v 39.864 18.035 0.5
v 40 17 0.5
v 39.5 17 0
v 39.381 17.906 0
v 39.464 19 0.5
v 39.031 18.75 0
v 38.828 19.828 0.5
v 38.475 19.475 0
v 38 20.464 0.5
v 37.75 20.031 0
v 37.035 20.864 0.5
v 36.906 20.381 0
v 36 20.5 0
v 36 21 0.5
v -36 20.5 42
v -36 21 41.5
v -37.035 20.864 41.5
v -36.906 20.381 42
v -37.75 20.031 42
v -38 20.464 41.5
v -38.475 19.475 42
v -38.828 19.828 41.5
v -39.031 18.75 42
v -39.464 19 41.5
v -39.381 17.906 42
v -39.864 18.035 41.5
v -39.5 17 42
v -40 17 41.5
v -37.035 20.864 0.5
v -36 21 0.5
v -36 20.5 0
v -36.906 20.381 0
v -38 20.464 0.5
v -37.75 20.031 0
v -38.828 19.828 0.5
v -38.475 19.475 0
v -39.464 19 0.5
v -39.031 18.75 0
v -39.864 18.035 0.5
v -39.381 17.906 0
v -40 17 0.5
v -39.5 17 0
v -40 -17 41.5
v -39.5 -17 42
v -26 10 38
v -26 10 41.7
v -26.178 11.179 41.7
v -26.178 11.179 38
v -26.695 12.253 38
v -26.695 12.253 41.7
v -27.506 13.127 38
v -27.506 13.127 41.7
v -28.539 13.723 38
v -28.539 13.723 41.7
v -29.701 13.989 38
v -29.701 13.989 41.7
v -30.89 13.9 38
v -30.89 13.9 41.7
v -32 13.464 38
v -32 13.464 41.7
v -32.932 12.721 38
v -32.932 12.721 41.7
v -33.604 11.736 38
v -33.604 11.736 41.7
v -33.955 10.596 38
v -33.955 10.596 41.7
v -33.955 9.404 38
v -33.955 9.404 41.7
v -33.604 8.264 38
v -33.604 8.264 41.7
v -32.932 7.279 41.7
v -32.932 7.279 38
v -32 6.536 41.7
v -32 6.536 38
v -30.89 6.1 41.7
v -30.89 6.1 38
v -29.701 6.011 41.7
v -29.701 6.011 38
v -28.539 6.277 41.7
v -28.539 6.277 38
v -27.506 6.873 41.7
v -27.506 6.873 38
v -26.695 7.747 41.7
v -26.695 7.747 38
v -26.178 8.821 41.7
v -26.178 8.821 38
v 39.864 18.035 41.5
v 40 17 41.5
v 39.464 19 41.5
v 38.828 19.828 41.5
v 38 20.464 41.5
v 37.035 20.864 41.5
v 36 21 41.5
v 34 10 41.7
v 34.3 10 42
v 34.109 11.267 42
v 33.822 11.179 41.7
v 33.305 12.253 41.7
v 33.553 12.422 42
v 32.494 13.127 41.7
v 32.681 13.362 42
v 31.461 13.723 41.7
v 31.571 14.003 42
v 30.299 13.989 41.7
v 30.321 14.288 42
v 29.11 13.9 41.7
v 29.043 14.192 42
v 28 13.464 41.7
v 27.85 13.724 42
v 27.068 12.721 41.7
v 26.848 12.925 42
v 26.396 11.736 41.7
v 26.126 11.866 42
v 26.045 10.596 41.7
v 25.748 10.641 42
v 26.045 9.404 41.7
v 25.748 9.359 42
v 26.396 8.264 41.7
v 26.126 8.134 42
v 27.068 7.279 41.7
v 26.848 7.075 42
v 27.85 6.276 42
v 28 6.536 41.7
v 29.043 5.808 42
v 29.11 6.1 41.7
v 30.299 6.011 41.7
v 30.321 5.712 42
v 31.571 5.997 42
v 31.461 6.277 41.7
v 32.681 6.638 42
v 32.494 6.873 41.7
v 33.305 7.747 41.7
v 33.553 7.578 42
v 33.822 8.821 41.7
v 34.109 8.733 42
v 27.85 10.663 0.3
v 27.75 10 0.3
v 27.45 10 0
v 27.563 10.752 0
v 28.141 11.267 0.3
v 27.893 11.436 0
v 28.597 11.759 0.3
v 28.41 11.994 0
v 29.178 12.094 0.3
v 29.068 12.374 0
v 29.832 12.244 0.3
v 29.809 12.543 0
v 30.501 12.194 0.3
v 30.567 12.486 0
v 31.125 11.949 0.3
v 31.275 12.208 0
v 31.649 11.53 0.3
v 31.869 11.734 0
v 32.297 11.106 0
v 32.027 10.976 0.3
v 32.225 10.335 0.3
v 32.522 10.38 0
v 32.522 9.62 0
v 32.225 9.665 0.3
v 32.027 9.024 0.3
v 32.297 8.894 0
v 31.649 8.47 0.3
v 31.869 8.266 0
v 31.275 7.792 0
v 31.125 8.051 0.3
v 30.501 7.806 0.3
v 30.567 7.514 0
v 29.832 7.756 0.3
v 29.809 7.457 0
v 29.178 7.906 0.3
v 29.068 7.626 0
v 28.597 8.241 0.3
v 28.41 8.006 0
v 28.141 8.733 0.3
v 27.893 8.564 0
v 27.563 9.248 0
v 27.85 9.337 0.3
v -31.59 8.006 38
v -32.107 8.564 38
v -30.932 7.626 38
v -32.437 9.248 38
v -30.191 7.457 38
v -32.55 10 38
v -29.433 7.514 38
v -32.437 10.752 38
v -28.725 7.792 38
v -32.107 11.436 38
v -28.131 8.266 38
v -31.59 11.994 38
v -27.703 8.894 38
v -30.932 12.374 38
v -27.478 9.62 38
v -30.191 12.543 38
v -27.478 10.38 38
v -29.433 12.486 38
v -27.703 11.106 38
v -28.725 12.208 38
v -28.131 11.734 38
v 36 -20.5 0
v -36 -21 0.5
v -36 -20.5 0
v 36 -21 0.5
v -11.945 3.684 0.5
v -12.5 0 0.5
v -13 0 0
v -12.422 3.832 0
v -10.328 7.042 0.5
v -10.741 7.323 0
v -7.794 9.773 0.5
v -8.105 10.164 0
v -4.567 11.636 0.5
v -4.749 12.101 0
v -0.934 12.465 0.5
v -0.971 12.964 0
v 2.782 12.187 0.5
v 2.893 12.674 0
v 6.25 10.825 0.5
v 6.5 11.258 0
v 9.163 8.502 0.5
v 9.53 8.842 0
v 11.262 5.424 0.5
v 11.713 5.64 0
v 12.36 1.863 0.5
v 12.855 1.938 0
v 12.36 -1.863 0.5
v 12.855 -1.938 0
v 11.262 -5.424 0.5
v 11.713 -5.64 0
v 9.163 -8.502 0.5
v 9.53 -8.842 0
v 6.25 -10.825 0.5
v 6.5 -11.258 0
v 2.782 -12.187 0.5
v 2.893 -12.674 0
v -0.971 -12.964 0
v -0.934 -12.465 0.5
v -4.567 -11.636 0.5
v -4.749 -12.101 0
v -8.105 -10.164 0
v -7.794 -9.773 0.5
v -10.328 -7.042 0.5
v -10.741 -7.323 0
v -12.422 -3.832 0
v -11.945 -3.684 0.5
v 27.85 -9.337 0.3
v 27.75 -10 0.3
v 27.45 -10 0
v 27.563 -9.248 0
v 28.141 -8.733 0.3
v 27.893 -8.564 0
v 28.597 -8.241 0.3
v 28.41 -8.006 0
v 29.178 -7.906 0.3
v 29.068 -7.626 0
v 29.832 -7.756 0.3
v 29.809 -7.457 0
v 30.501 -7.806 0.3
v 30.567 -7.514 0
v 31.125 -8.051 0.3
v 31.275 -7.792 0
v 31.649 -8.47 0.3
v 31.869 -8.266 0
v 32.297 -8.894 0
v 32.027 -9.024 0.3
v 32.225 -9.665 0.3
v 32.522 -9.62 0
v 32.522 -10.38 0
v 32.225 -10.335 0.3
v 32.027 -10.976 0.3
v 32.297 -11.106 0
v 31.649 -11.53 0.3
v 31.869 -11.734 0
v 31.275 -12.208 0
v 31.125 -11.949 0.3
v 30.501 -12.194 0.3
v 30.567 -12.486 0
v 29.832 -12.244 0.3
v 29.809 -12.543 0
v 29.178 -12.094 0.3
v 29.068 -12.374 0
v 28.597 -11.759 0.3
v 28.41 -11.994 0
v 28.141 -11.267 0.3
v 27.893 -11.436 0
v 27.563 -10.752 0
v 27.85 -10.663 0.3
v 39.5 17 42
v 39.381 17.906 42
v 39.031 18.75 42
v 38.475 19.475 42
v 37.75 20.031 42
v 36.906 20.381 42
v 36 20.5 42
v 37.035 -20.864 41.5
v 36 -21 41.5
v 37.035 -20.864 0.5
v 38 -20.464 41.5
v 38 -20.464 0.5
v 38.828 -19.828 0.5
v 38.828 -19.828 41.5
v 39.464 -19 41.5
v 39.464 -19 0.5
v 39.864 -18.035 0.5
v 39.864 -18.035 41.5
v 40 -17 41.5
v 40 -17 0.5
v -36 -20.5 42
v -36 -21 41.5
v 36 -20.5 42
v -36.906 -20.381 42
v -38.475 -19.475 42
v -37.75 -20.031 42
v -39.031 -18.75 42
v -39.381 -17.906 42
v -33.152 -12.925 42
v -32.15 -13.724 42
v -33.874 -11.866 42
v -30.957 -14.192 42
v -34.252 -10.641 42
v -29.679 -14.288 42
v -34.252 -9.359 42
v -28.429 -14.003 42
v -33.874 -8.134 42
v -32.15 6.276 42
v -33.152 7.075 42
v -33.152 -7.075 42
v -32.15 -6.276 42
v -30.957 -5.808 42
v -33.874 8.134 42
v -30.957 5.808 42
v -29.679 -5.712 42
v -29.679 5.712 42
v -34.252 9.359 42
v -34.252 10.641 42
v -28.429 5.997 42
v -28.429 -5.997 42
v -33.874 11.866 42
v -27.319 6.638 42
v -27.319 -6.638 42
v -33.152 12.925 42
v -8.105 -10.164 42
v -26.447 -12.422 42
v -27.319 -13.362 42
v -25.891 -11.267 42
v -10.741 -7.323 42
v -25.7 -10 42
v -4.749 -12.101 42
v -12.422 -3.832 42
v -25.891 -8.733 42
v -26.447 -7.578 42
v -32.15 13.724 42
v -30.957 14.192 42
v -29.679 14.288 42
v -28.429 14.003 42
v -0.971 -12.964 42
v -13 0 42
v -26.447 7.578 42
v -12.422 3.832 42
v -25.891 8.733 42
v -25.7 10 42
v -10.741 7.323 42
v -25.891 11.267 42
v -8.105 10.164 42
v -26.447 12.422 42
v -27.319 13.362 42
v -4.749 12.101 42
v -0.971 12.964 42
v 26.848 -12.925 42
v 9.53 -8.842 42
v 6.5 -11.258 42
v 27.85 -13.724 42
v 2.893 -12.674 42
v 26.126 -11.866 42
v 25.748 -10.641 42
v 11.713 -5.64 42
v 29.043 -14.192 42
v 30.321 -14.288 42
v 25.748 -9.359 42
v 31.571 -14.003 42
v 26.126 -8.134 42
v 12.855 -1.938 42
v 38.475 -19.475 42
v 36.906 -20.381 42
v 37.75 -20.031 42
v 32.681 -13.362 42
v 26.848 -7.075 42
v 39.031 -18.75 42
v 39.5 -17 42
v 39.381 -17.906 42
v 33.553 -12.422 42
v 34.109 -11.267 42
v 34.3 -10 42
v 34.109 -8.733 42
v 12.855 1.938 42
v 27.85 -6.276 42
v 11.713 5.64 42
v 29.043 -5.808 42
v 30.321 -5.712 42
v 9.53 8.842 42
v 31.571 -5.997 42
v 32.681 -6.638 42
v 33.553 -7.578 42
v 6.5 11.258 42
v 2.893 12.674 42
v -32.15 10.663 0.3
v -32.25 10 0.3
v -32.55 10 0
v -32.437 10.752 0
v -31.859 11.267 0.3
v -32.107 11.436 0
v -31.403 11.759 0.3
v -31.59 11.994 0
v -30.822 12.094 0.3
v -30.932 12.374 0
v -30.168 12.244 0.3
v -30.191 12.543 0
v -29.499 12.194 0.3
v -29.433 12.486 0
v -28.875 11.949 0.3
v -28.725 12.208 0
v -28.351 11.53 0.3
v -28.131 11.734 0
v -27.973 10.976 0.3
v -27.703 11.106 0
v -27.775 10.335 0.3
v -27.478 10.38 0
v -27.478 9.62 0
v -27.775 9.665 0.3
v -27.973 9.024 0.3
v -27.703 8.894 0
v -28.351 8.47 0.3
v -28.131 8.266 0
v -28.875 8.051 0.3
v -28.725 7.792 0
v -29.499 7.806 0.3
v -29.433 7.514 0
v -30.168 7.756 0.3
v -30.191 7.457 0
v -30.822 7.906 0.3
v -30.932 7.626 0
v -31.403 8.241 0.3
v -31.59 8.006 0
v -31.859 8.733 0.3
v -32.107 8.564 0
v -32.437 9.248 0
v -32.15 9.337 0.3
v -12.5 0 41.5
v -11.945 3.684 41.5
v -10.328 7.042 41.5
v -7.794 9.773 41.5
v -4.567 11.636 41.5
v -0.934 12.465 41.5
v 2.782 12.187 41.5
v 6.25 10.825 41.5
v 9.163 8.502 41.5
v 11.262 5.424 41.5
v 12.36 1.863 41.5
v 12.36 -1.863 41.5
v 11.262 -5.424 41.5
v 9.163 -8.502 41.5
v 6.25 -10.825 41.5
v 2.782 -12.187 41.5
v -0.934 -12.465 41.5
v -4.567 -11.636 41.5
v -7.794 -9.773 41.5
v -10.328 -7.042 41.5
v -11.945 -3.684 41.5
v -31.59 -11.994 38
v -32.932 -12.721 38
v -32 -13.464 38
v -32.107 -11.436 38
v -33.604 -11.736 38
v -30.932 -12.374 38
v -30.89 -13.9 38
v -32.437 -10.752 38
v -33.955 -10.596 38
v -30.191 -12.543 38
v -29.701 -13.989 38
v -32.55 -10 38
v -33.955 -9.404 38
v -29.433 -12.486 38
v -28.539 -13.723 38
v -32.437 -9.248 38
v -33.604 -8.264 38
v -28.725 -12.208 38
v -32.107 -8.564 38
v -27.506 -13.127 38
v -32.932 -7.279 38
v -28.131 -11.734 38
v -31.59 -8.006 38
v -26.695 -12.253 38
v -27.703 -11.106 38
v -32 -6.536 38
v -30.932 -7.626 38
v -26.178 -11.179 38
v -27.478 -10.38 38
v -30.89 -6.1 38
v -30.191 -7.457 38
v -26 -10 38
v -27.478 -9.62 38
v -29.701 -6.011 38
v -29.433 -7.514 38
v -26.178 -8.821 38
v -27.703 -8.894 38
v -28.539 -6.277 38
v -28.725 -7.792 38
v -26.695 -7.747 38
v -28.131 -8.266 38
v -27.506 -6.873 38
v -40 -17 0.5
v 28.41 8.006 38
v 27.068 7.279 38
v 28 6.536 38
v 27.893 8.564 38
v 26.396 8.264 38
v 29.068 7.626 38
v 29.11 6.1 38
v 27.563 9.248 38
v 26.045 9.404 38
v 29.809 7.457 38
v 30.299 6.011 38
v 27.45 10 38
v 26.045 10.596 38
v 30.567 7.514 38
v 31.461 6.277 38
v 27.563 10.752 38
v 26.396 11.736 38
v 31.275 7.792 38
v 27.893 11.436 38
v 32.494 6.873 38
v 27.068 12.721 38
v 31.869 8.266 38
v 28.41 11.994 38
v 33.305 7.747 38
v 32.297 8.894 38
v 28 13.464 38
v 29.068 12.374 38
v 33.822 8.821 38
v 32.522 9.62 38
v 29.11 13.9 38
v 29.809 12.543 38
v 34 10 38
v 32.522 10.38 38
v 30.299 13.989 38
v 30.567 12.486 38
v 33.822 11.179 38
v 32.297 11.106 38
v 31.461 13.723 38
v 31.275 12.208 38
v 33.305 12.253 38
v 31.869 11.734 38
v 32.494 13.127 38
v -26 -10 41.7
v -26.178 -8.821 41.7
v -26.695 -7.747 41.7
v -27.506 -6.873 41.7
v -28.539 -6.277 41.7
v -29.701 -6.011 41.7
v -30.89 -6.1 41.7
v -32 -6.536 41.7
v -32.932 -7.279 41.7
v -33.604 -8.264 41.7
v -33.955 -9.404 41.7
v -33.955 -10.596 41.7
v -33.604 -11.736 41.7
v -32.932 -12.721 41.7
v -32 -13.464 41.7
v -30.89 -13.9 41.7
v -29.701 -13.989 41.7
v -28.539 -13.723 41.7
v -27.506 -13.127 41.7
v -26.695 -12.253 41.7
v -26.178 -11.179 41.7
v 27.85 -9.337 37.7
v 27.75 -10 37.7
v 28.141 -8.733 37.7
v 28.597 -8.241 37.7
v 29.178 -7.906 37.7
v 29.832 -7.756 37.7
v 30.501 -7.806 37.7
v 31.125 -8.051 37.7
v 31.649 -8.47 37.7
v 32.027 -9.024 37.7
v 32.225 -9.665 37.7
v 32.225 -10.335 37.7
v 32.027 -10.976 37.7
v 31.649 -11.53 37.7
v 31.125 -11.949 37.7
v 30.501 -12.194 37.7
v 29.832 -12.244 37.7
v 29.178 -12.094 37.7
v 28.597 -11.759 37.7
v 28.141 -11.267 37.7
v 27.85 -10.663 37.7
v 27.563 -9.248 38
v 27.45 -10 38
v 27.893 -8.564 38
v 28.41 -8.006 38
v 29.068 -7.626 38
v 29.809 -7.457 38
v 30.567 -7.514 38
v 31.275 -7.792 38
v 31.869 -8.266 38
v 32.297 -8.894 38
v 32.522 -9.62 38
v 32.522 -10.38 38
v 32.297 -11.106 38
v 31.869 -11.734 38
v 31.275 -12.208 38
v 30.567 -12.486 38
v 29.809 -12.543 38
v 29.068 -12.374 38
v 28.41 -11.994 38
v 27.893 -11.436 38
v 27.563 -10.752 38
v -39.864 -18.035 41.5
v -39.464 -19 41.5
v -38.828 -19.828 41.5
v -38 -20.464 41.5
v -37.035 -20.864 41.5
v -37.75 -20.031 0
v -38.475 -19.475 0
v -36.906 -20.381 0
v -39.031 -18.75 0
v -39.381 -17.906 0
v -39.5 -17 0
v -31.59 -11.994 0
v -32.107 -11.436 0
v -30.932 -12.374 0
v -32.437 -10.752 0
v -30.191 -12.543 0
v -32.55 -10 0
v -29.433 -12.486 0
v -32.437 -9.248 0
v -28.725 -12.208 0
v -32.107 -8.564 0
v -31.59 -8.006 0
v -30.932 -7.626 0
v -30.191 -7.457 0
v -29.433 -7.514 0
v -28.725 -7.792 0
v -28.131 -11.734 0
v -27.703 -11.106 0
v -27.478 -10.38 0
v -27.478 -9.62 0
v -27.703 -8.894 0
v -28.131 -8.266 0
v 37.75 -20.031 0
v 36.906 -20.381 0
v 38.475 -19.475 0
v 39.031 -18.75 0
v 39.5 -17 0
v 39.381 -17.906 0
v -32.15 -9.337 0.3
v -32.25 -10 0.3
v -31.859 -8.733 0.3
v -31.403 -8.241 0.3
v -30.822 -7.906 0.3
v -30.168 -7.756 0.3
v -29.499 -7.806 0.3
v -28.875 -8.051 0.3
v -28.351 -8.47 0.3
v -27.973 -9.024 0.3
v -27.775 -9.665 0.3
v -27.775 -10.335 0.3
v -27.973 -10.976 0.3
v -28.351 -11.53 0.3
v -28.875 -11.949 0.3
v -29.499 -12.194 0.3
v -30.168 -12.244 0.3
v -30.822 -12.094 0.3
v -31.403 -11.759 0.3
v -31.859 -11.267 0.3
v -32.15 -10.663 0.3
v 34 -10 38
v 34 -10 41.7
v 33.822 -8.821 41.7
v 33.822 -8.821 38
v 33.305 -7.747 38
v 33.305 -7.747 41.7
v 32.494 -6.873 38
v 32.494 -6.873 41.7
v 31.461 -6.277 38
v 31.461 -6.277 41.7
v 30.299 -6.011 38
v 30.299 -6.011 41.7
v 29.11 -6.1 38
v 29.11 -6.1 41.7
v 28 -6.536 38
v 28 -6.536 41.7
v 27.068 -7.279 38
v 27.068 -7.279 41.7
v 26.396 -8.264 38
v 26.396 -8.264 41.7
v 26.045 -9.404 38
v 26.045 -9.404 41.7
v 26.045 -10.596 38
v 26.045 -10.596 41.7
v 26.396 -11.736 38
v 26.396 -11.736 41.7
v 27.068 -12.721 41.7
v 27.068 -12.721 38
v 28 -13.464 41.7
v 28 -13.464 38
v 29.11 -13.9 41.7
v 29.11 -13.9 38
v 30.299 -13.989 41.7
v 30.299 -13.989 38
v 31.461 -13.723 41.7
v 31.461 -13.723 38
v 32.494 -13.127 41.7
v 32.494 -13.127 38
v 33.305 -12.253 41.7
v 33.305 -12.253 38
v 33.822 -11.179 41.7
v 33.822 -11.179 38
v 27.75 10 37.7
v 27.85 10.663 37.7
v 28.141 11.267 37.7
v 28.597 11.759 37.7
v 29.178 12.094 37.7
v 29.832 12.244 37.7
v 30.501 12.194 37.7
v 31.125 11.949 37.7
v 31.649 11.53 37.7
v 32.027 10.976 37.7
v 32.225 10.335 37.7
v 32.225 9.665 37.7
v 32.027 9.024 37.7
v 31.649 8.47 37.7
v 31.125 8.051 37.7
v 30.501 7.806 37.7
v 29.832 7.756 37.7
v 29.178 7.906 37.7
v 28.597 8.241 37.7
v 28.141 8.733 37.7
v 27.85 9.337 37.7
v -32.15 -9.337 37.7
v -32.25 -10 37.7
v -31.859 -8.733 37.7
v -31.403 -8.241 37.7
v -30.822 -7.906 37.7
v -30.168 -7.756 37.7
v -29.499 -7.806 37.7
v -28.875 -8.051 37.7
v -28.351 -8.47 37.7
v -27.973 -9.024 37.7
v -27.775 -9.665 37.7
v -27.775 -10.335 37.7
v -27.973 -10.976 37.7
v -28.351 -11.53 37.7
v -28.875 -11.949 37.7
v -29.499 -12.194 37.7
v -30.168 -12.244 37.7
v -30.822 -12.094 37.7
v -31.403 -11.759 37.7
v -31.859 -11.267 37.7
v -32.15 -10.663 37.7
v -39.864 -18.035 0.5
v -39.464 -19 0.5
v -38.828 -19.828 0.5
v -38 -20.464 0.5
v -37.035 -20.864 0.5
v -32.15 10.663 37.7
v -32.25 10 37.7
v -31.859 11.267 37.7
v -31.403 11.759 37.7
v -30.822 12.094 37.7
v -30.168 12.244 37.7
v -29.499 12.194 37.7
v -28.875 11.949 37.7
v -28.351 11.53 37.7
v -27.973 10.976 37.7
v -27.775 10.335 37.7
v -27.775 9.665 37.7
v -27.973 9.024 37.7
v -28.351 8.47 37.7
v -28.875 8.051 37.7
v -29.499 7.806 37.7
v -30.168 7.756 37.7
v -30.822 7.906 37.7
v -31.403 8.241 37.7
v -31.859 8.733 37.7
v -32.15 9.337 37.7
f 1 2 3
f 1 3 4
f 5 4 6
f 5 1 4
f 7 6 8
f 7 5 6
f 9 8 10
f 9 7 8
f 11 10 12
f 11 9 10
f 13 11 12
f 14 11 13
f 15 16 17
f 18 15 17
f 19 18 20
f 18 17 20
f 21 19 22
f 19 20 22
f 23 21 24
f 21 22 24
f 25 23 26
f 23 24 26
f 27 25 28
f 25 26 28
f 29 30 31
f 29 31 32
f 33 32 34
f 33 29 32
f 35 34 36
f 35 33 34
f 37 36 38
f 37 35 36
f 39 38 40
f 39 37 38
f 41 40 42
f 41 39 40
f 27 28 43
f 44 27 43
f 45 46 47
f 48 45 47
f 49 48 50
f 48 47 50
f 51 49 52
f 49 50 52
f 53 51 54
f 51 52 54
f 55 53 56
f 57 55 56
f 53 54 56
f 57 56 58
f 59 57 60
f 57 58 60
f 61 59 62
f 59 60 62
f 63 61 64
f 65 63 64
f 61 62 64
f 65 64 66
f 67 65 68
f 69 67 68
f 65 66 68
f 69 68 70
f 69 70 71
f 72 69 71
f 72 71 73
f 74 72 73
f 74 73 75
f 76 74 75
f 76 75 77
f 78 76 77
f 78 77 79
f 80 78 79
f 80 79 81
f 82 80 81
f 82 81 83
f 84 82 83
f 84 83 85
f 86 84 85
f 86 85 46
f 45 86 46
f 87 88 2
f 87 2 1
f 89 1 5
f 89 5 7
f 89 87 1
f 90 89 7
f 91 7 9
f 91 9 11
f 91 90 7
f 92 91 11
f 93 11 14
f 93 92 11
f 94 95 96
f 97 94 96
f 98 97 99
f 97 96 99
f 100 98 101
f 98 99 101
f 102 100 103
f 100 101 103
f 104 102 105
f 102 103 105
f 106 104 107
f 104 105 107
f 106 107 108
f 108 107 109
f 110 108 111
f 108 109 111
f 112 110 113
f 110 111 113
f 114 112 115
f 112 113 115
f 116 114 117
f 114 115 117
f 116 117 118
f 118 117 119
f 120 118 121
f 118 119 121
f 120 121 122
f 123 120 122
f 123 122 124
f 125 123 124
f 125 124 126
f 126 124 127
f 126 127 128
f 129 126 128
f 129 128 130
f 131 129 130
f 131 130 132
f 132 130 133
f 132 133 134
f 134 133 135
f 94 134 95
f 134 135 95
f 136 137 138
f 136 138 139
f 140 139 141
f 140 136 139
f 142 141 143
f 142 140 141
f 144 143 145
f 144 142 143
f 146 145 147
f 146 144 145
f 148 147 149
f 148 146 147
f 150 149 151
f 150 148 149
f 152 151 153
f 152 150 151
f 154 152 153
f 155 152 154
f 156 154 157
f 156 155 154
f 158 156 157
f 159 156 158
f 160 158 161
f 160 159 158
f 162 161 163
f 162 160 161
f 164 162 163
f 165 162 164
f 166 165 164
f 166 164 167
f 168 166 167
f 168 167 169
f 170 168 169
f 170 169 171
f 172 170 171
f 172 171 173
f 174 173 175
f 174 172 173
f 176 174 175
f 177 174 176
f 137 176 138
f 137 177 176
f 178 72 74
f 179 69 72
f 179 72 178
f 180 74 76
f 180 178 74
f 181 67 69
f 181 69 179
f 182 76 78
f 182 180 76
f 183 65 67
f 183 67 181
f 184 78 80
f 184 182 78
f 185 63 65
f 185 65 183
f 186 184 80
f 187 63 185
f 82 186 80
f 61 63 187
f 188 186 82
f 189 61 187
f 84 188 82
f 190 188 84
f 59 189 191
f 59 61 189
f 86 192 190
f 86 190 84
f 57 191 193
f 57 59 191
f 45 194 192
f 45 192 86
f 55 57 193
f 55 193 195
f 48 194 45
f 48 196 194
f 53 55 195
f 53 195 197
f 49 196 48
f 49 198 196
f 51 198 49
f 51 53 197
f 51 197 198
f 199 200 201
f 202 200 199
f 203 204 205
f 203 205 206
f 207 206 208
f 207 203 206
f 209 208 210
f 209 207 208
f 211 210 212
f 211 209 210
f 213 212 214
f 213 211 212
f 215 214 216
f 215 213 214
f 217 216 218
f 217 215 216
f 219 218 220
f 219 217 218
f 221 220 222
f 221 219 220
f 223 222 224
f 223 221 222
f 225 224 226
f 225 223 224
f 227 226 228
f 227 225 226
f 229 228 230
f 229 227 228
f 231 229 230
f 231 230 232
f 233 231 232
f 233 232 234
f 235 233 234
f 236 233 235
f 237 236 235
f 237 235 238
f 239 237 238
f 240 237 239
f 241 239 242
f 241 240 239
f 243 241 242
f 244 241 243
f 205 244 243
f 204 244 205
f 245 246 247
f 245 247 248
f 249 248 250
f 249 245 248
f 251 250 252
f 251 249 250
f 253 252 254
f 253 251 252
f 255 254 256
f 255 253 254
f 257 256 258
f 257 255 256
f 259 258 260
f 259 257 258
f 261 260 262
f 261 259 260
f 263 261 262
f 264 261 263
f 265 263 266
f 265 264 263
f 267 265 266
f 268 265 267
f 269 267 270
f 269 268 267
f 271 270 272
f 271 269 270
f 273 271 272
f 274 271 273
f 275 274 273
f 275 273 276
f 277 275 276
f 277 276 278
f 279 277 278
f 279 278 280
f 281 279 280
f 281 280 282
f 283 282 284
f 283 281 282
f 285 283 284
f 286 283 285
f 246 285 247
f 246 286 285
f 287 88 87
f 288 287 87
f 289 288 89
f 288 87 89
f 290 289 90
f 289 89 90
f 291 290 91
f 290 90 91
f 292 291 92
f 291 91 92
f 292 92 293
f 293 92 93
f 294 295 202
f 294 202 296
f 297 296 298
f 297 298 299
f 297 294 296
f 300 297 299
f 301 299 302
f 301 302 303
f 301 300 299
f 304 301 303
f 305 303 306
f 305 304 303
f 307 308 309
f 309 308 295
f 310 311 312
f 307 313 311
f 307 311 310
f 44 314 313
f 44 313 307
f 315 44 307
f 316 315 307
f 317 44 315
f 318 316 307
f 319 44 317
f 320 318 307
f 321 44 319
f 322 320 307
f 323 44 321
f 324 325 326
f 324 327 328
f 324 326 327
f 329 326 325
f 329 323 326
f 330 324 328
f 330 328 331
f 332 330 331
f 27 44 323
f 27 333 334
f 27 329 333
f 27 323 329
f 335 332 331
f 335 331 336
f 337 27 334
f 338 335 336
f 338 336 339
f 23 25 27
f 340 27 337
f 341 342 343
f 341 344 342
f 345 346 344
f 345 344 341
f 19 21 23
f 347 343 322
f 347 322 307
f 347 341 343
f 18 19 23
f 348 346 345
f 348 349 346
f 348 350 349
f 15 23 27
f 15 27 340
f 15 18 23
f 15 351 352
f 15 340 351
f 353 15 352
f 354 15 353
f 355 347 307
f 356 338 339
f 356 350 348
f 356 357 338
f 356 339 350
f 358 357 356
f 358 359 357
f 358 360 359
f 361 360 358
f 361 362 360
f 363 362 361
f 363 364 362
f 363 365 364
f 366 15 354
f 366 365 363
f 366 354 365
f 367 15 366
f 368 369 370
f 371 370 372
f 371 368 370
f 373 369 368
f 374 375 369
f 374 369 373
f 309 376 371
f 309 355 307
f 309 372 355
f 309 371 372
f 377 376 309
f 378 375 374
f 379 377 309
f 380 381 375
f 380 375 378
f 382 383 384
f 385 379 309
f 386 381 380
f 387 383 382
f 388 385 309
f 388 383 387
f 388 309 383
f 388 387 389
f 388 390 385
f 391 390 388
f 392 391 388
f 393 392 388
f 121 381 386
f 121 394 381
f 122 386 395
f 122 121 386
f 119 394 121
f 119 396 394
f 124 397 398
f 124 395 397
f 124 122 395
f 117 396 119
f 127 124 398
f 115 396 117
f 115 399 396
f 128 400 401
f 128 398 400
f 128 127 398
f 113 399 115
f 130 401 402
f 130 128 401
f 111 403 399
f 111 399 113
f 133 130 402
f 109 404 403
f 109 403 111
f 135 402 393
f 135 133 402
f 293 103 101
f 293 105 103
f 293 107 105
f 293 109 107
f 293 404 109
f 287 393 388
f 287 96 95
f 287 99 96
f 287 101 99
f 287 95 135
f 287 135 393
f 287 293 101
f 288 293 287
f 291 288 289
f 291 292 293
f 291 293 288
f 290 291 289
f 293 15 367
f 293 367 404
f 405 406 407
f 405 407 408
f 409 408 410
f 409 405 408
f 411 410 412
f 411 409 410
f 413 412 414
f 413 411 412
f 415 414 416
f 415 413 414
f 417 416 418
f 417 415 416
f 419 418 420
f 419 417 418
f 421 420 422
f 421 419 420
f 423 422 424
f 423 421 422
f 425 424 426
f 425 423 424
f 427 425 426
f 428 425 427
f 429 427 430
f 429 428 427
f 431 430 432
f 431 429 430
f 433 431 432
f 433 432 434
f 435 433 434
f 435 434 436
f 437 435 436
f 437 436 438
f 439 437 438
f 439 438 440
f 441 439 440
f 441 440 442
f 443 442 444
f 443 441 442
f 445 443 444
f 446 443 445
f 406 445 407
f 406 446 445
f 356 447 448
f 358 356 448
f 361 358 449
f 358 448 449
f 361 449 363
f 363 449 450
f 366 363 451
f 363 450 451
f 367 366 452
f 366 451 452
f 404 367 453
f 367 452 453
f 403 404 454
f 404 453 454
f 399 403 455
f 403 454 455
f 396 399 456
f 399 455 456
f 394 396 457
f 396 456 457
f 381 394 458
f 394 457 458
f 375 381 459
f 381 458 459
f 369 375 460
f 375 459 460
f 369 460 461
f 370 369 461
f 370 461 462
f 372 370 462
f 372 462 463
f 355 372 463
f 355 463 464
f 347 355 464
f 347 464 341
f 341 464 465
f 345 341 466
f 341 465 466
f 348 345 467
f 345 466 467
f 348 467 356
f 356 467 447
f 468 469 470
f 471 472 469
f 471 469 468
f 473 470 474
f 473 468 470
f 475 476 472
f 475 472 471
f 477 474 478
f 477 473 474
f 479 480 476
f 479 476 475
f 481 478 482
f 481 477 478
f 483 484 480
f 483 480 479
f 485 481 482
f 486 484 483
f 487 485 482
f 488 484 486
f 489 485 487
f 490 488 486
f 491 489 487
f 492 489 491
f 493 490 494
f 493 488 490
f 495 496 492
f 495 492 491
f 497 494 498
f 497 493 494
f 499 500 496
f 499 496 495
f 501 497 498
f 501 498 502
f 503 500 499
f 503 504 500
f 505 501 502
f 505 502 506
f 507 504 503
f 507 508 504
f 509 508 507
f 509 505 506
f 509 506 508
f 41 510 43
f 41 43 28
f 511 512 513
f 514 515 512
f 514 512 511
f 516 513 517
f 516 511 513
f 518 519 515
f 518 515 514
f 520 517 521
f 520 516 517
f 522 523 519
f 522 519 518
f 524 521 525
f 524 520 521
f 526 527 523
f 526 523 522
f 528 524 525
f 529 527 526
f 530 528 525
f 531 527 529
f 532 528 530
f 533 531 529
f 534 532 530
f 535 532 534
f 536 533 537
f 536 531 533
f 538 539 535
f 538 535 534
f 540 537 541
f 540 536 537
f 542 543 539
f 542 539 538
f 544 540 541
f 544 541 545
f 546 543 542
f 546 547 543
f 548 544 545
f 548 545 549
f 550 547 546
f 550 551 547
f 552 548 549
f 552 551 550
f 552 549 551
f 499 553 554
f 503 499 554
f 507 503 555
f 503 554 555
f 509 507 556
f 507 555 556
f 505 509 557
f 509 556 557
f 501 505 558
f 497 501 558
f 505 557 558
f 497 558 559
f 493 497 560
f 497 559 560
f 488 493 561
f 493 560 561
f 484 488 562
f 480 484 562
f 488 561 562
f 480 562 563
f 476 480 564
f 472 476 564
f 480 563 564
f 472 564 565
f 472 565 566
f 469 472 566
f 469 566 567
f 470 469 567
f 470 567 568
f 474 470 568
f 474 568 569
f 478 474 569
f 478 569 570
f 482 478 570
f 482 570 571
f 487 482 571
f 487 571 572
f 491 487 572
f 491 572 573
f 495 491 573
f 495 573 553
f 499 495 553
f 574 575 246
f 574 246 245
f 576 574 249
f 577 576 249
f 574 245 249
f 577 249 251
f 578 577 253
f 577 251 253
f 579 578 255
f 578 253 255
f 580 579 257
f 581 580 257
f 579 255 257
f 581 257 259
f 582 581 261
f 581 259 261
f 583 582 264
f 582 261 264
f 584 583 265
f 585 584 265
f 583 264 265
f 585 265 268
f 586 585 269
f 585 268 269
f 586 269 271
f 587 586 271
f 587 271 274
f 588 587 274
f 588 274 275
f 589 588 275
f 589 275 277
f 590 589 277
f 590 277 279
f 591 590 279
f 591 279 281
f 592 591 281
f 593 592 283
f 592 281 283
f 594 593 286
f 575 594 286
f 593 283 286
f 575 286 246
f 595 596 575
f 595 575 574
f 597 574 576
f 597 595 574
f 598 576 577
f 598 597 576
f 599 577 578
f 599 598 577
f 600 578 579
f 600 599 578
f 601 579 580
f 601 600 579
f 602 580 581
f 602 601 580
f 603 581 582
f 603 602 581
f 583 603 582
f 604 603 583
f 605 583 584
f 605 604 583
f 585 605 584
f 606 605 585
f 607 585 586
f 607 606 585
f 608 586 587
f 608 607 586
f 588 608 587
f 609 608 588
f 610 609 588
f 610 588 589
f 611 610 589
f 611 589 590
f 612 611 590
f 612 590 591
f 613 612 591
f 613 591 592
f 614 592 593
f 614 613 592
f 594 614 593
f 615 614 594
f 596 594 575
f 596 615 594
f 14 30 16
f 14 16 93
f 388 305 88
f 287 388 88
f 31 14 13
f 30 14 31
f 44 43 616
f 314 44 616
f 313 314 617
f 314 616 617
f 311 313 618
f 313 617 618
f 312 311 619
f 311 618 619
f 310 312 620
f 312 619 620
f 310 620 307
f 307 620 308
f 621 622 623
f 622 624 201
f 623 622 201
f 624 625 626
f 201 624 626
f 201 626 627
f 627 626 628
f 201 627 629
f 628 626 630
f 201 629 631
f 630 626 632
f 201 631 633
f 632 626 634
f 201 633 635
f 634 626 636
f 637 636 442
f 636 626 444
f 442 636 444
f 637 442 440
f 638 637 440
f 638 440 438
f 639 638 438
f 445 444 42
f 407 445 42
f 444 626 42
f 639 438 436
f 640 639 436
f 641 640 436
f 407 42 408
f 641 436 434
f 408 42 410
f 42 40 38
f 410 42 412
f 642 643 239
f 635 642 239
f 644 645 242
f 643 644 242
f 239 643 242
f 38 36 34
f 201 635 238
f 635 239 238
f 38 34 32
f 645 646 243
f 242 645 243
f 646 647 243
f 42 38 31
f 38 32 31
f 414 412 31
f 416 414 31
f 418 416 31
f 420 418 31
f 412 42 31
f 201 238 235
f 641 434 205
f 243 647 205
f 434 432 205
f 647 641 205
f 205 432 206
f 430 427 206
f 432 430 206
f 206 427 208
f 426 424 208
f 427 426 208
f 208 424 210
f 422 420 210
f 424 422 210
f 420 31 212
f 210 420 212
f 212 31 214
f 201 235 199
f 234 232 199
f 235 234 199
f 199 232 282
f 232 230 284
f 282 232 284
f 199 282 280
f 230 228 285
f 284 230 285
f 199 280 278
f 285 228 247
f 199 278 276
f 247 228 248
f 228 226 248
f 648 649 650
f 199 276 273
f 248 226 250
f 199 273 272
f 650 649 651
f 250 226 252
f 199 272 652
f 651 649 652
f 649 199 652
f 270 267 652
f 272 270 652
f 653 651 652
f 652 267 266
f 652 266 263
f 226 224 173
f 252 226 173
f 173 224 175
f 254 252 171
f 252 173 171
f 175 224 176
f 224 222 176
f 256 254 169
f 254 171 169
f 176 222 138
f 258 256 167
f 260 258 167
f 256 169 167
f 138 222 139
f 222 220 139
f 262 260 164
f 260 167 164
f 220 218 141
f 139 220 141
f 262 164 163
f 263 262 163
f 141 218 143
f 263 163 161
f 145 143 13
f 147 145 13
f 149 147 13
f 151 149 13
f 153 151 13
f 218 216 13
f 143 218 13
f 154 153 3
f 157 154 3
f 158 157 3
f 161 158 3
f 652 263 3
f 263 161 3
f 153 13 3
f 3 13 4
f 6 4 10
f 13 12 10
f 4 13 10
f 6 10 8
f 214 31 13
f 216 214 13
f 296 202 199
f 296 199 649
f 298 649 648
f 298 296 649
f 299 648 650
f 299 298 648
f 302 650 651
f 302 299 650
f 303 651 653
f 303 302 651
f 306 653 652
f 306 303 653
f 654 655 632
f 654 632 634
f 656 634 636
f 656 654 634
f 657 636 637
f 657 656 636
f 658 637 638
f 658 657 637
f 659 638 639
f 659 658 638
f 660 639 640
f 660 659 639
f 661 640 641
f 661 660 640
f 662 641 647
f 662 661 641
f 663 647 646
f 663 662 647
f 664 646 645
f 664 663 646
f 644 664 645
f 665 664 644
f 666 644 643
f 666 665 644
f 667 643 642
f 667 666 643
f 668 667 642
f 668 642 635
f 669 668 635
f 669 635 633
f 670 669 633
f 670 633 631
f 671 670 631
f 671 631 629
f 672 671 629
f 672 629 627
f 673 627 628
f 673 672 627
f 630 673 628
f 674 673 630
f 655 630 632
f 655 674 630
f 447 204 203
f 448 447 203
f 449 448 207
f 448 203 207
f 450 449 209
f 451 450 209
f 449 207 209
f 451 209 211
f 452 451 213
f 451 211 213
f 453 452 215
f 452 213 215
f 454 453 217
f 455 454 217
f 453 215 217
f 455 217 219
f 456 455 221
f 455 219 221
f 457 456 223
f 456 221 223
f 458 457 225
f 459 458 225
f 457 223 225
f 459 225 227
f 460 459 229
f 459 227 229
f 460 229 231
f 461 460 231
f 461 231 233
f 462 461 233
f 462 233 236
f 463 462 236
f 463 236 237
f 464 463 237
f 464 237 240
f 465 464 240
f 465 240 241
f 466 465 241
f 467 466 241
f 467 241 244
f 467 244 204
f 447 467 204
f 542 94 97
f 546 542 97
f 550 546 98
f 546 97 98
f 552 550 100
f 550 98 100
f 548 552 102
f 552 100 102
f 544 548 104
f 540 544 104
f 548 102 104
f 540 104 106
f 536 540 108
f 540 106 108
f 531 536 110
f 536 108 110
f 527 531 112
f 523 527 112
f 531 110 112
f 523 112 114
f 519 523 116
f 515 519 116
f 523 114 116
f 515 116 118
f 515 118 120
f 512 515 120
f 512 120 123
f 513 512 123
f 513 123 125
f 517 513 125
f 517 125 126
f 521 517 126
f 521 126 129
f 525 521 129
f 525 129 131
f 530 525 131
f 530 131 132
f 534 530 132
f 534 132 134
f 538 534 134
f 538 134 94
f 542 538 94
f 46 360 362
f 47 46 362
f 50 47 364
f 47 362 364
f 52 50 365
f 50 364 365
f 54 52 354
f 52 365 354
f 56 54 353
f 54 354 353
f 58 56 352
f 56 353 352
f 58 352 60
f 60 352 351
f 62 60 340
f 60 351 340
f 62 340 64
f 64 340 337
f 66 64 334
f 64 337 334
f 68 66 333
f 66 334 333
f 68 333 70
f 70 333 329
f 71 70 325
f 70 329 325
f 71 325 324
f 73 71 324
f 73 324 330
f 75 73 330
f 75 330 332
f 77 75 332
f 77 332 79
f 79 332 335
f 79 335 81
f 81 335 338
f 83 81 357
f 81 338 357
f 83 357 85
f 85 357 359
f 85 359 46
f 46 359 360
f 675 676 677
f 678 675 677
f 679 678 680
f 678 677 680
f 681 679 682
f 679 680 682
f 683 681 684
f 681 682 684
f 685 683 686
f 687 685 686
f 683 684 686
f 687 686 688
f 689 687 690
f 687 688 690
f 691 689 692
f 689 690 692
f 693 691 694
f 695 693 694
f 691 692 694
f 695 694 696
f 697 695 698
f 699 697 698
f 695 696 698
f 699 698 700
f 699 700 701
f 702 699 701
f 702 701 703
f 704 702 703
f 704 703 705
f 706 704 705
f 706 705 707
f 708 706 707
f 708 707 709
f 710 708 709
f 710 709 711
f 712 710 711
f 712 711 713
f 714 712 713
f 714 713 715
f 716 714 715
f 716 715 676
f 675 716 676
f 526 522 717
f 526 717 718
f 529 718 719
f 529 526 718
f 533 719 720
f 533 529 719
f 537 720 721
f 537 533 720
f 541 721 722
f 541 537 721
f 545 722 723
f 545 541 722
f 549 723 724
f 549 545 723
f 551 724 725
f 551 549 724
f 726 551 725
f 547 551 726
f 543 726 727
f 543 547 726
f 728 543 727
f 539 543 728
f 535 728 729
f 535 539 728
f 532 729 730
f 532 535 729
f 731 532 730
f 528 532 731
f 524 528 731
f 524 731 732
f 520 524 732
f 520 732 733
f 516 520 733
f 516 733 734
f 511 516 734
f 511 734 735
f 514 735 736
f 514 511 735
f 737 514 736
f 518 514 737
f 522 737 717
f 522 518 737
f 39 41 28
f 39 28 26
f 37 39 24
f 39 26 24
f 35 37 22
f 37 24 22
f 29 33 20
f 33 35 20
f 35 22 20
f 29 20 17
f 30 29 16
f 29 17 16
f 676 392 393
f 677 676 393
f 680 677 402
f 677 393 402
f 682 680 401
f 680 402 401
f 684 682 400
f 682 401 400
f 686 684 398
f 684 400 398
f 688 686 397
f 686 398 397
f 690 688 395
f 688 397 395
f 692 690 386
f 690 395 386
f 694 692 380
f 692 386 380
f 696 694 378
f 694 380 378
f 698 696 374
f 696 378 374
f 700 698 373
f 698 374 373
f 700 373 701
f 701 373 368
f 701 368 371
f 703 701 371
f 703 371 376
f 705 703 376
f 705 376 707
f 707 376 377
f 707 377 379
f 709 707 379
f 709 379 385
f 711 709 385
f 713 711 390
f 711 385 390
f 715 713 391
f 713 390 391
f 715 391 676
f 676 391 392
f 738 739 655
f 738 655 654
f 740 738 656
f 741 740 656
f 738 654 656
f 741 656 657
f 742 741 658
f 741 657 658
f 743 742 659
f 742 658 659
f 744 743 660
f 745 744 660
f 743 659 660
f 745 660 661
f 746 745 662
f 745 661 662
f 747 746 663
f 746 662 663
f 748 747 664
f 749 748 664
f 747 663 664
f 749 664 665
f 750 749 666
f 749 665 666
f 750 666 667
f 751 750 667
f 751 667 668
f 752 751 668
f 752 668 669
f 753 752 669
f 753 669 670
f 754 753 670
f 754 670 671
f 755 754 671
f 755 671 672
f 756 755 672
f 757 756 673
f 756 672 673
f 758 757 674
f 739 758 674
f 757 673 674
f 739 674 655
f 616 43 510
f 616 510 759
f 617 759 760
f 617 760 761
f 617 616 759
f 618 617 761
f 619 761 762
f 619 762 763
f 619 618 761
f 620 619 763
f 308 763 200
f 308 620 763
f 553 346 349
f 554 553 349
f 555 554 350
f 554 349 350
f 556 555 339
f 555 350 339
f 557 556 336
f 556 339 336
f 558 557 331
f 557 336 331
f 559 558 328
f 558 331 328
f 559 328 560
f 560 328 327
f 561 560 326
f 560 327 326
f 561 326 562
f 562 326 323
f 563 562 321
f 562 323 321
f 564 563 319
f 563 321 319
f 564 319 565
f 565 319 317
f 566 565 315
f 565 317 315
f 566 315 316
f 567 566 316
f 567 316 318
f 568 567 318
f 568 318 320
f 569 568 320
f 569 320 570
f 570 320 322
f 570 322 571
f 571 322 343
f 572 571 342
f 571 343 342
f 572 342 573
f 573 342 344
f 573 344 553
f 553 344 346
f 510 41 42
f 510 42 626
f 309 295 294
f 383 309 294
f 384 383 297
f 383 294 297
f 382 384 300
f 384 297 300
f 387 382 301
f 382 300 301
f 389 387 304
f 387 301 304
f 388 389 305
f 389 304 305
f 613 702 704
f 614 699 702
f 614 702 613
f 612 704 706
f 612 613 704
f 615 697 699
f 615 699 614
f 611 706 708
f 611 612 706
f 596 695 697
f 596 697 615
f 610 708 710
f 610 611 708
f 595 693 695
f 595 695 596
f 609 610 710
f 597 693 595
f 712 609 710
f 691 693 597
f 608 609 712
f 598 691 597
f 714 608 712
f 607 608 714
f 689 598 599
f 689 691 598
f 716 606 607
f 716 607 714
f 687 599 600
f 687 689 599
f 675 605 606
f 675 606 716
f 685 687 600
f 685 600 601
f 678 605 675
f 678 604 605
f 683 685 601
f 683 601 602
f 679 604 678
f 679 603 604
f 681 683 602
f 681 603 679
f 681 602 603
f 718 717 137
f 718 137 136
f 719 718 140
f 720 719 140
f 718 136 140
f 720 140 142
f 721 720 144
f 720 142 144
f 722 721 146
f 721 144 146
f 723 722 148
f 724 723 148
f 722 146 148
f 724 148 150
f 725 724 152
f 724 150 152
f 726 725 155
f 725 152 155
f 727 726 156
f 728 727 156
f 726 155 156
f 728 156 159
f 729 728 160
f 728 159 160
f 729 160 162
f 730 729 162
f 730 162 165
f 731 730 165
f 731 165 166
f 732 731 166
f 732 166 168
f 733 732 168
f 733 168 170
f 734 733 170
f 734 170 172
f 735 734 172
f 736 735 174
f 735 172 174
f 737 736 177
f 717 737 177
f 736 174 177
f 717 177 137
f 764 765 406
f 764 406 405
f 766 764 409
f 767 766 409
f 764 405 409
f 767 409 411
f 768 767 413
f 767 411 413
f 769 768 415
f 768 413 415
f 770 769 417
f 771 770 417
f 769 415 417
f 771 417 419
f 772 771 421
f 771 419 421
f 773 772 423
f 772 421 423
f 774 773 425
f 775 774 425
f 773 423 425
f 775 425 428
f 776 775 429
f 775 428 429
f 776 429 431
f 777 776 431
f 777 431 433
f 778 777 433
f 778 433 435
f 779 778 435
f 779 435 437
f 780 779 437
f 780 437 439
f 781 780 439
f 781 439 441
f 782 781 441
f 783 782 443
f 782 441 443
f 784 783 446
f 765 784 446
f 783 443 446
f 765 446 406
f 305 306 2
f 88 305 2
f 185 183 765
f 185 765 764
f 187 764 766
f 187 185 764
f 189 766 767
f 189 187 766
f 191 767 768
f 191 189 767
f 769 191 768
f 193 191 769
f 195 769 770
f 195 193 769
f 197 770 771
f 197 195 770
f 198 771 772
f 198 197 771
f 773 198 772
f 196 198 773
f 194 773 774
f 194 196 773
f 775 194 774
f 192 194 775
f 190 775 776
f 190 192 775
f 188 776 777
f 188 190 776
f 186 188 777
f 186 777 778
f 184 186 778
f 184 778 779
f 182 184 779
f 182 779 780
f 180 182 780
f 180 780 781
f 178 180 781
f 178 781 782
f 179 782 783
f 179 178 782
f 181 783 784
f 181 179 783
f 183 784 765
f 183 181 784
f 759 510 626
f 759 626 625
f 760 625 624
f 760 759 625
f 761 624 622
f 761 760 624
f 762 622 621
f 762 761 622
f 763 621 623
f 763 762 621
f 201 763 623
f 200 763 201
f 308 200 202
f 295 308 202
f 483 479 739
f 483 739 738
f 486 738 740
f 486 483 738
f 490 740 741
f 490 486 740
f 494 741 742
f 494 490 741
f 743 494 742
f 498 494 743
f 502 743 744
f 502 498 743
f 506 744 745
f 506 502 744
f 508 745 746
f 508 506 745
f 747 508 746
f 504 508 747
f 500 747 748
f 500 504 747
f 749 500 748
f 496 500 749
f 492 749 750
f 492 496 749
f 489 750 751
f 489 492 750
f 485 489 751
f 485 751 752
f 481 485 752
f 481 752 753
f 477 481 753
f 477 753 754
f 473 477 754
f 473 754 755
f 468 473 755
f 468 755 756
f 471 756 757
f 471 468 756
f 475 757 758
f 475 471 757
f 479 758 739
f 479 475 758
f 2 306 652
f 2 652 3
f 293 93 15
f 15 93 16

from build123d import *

# Parameters (mm, degrees)
SKETCH1_W                      = 80
SKETCH1_H                      = 42
BOSS_EXTRUDE1_DEPTH            = 42
FILLET1_R                      = 4
CHAMFER1_SIZE                  = 0.5
CBORE_FOR_M4_SHCS1_D           = 4.5
CBORE_FOR_M4_SHCS1_CBORE_D     = 8
CBORE_FOR_M4_SHCS1_CBORE_DEPTH = 4
SKETCH5_R                      = 12.5
CUT_EXTRUDE2_DEPTH             = 62.684682053
CHAMFER2_SIZE                  = 0.5
CHAMFER3_SIZE                  = 0.3


with BuildPart() as part:
    # Sketch1 → Boss-Extrude1 (new body)
    with BuildSketch(Plane.XY):
        Rectangle(SKETCH1_W, SKETCH1_H)
    extrude(amount=BOSS_EXTRUDE1_DEPTH)

    # Fillet1
    fillet1_edges = [part.edges().sort_by_distance(p)[0] for p in [
        (40, -21, 21),
        (-40, -21, 21),
        (-40, 21, 21),
        (40, 21, 21),
    ]]
    fillet(fillet1_edges, radius=FILLET1_R)

    # Chamfer1
    chamfer1_edges = [part.edges().sort_by_distance(p)[0] for p in [
        (40, 0, 0),
        (40, 0, 42),
        (0, -21, 0),
        (-40, 0, 0),
        (0, 21, 0),
        (-38.828427125, 19.828427125, 0),
        (38.828427125, 19.828427125, 0),
        (-38.828427125, -19.828427125, 0),
        (38.828427125, -19.828427125, 0),
        (0, -21, 42),
        (0, 21, 42),
        (-40, 0, 42),
        (-38.828427125, 19.828427125, 42),
        (38.828427125, 19.828427125, 42),
        (-38.828427125, -19.828427125, 42),
        (38.828427125, -19.828427125, 42),
    ]]
    chamfer(chamfer1_edges, length=CHAMFER1_SIZE)

    # CBORE for M4 SHCS1 (through all)
    with Locations(Plane.XY.offset(42)):
        with Locations((-30, 10), (30, 10), (30, -10), (-30, -10)):
            CounterBoreHole(CBORE_FOR_M4_SHCS1_D / 2, CBORE_FOR_M4_SHCS1_CBORE_D / 2, CBORE_FOR_M4_SHCS1_CBORE_DEPTH)

    # Sketch5 → Cut-Extrude2 (cut, through all)
    with BuildSketch(Plane(origin=(0, 0, 0), x_dir=(-1, 0, 0), z_dir=(0, 0, -1))):
        Circle(SKETCH5_R)
    extrude(amount=-CUT_EXTRUDE2_DEPTH, mode=Mode.SUBTRACT)

    # Chamfer2
    chamfer2_edges = [part.edges().sort_by_distance(p)[0] for p in [
        (12.5, 0, 42),
        (12.5, 0, 0),
    ]]
    chamfer(chamfer2_edges, length=CHAMFER2_SIZE)

    # Chamfer3
    chamfer3_edges = [part.edges().sort_by_distance(p)[0] for p in [
        (26, 10, 42),
        (32.25, 10, 0),
        (32.25, 10, 38),
        (-34, 10, 42),
        (-27.75, 10, 0),
        (-27.75, 10, 38),
        (-34, -10, 42),
        (-27.75, -10, 0),
        (-27.75, -10, 38),
        (26, -10, 42),
        (32.25, -10, 0),
        (32.25, -10, 38),
    ]]
    chamfer(chamfer3_edges, length=CHAMFER3_SIZE)


solid = part.part
